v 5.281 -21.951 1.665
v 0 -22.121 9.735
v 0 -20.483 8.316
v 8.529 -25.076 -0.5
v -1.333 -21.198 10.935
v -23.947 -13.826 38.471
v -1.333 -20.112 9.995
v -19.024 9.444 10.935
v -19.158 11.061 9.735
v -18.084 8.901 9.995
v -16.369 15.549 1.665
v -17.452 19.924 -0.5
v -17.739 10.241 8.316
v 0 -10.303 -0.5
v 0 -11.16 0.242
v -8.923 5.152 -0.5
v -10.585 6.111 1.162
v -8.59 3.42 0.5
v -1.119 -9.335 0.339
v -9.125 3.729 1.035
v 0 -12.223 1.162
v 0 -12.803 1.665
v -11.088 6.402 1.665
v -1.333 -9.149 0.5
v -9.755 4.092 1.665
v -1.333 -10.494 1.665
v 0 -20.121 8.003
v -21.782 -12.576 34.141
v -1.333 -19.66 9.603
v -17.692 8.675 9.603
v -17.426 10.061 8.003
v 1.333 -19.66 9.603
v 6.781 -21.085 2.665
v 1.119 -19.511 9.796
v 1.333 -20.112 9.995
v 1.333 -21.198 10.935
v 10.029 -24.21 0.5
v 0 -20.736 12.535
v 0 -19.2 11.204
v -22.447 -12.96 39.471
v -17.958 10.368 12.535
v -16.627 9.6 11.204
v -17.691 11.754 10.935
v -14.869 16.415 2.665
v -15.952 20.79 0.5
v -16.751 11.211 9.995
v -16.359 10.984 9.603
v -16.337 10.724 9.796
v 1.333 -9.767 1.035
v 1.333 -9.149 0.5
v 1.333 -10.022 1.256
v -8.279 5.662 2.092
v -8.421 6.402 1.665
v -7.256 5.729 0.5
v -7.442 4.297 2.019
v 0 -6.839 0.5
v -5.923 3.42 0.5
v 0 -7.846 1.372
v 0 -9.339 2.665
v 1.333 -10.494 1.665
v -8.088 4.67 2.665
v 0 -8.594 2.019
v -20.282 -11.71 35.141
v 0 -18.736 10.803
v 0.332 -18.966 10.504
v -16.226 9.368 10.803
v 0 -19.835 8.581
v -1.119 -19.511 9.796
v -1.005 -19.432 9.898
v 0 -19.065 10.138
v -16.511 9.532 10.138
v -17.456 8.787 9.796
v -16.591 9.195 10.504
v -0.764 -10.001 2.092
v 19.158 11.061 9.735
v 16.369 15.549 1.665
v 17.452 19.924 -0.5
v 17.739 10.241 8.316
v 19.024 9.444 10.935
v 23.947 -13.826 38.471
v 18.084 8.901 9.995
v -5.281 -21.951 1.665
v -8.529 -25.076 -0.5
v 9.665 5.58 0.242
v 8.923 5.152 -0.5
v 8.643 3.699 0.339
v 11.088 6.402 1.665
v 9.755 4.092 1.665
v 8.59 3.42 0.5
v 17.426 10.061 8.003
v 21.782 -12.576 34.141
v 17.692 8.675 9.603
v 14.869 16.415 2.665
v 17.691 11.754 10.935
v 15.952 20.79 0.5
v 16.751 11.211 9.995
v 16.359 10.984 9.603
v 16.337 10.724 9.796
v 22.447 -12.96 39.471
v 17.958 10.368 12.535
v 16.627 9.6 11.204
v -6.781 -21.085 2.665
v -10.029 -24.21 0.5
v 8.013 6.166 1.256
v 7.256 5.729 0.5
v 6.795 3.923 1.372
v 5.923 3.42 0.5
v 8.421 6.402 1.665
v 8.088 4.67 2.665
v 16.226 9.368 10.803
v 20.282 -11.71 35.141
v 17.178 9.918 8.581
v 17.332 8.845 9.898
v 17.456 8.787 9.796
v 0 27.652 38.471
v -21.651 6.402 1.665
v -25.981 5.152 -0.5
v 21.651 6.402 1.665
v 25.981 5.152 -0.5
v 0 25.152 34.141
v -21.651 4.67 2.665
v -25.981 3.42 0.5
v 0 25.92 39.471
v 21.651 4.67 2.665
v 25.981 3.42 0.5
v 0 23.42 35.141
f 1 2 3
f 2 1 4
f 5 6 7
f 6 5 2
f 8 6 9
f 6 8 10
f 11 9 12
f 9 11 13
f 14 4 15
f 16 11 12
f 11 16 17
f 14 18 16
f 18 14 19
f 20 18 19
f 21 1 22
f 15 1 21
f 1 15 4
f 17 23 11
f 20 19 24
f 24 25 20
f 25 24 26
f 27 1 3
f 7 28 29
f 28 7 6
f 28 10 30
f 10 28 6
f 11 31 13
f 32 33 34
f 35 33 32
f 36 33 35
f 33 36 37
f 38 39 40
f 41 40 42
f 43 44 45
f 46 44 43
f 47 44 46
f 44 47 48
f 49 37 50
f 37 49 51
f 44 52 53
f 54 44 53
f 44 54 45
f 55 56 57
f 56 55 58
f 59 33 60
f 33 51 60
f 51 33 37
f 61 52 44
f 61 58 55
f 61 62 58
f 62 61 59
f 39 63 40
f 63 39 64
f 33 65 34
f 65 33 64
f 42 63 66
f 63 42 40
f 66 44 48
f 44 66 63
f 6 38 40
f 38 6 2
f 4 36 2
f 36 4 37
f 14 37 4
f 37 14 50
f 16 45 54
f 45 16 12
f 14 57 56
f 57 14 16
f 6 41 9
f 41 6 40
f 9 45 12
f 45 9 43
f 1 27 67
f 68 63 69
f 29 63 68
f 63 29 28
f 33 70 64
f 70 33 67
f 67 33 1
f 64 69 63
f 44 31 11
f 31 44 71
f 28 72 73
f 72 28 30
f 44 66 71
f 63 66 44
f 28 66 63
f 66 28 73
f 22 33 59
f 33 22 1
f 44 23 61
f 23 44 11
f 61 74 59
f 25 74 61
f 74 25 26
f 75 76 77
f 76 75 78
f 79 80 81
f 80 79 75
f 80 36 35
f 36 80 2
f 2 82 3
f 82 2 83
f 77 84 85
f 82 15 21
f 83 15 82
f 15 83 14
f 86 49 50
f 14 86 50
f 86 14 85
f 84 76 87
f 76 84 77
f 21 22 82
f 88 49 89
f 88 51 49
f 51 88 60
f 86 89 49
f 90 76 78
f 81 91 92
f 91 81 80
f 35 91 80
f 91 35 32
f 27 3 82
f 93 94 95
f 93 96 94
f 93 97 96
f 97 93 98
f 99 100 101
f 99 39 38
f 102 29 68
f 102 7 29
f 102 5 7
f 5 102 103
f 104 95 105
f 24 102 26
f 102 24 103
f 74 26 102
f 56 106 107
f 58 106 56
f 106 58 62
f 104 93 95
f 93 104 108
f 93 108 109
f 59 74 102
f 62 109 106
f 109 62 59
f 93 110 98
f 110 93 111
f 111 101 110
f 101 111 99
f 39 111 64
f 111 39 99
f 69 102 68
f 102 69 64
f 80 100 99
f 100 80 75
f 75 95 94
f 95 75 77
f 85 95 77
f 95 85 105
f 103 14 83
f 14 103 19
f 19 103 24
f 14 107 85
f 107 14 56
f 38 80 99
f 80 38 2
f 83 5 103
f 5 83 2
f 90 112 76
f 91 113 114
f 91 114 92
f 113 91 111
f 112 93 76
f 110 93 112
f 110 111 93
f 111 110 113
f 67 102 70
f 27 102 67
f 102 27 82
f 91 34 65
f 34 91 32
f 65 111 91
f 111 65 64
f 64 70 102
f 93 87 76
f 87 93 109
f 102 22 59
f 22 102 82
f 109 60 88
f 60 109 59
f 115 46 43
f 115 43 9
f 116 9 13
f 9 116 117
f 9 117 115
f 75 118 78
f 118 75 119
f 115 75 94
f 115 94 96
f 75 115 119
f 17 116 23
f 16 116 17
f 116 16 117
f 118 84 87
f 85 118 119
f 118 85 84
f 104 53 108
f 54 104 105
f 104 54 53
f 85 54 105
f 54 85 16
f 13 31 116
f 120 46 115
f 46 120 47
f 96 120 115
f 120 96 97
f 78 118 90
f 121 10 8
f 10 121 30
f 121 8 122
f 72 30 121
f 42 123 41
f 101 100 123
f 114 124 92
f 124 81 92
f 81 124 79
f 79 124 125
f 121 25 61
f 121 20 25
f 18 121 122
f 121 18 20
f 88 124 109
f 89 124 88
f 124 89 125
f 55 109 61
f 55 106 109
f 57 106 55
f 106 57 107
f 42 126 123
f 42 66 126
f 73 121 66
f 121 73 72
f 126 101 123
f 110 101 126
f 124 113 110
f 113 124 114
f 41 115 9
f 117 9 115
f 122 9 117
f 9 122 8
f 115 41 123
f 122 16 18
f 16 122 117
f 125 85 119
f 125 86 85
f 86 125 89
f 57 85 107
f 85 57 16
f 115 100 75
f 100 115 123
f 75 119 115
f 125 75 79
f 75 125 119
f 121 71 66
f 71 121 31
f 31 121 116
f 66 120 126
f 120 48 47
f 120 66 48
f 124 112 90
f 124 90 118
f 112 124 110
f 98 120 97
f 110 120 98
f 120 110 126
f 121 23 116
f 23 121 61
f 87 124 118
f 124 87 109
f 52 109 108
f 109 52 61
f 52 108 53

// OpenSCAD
depth = 2; //[1:10]
size = 30; //[10:100]
thickness = 5; //[1:10]
lean = -30; //[-180:180]
div = 7; //[1.5:10]

formGenerator(depth, size, thickness, lean, div);

//base 2D triangle
module triangle2D(dia = 20, thickness = 2) {
    translate([0,dia/2,0])
    rotate([0,0,90])
    difference() {
        circle(dia,$fn=3);
        circle(dia-thickness,$fn=3);
    }
}

//base 3D triangle
module triangle3D(depth = 2, size = 20, thickness = 2) {
    linear_extrude(height = depth , center = true, convexity = 10, twist = 0)
    triangle2D(size, thickness);
}

module formGenerator(d, s, t, l, div=2) {
    depth = d;
    size = s;
    thickness = t;
    lean = l;

    for (a=[1:3]) {
        rotate([0,0,(360/3) * a])
        translate([0,size/div,0])
        rotate([lean,0,0])
        rotate([90,0,0])
        triangle3D(depth, size, thickness);
    }
}

module forms() {

    translate([80,0,0])
    color("green")
    formGenerator(2,30,5,45);

    translate([0,80,0])
    color("lime")
    formGenerator(2,30,5,20);

    translate([80,80,0])
    color("red")
    formGenerator(2,30,5,20, 5);

    translate([-80,0,0])
    color("pink")
    formGenerator(2,30,5,-30,7);
}
